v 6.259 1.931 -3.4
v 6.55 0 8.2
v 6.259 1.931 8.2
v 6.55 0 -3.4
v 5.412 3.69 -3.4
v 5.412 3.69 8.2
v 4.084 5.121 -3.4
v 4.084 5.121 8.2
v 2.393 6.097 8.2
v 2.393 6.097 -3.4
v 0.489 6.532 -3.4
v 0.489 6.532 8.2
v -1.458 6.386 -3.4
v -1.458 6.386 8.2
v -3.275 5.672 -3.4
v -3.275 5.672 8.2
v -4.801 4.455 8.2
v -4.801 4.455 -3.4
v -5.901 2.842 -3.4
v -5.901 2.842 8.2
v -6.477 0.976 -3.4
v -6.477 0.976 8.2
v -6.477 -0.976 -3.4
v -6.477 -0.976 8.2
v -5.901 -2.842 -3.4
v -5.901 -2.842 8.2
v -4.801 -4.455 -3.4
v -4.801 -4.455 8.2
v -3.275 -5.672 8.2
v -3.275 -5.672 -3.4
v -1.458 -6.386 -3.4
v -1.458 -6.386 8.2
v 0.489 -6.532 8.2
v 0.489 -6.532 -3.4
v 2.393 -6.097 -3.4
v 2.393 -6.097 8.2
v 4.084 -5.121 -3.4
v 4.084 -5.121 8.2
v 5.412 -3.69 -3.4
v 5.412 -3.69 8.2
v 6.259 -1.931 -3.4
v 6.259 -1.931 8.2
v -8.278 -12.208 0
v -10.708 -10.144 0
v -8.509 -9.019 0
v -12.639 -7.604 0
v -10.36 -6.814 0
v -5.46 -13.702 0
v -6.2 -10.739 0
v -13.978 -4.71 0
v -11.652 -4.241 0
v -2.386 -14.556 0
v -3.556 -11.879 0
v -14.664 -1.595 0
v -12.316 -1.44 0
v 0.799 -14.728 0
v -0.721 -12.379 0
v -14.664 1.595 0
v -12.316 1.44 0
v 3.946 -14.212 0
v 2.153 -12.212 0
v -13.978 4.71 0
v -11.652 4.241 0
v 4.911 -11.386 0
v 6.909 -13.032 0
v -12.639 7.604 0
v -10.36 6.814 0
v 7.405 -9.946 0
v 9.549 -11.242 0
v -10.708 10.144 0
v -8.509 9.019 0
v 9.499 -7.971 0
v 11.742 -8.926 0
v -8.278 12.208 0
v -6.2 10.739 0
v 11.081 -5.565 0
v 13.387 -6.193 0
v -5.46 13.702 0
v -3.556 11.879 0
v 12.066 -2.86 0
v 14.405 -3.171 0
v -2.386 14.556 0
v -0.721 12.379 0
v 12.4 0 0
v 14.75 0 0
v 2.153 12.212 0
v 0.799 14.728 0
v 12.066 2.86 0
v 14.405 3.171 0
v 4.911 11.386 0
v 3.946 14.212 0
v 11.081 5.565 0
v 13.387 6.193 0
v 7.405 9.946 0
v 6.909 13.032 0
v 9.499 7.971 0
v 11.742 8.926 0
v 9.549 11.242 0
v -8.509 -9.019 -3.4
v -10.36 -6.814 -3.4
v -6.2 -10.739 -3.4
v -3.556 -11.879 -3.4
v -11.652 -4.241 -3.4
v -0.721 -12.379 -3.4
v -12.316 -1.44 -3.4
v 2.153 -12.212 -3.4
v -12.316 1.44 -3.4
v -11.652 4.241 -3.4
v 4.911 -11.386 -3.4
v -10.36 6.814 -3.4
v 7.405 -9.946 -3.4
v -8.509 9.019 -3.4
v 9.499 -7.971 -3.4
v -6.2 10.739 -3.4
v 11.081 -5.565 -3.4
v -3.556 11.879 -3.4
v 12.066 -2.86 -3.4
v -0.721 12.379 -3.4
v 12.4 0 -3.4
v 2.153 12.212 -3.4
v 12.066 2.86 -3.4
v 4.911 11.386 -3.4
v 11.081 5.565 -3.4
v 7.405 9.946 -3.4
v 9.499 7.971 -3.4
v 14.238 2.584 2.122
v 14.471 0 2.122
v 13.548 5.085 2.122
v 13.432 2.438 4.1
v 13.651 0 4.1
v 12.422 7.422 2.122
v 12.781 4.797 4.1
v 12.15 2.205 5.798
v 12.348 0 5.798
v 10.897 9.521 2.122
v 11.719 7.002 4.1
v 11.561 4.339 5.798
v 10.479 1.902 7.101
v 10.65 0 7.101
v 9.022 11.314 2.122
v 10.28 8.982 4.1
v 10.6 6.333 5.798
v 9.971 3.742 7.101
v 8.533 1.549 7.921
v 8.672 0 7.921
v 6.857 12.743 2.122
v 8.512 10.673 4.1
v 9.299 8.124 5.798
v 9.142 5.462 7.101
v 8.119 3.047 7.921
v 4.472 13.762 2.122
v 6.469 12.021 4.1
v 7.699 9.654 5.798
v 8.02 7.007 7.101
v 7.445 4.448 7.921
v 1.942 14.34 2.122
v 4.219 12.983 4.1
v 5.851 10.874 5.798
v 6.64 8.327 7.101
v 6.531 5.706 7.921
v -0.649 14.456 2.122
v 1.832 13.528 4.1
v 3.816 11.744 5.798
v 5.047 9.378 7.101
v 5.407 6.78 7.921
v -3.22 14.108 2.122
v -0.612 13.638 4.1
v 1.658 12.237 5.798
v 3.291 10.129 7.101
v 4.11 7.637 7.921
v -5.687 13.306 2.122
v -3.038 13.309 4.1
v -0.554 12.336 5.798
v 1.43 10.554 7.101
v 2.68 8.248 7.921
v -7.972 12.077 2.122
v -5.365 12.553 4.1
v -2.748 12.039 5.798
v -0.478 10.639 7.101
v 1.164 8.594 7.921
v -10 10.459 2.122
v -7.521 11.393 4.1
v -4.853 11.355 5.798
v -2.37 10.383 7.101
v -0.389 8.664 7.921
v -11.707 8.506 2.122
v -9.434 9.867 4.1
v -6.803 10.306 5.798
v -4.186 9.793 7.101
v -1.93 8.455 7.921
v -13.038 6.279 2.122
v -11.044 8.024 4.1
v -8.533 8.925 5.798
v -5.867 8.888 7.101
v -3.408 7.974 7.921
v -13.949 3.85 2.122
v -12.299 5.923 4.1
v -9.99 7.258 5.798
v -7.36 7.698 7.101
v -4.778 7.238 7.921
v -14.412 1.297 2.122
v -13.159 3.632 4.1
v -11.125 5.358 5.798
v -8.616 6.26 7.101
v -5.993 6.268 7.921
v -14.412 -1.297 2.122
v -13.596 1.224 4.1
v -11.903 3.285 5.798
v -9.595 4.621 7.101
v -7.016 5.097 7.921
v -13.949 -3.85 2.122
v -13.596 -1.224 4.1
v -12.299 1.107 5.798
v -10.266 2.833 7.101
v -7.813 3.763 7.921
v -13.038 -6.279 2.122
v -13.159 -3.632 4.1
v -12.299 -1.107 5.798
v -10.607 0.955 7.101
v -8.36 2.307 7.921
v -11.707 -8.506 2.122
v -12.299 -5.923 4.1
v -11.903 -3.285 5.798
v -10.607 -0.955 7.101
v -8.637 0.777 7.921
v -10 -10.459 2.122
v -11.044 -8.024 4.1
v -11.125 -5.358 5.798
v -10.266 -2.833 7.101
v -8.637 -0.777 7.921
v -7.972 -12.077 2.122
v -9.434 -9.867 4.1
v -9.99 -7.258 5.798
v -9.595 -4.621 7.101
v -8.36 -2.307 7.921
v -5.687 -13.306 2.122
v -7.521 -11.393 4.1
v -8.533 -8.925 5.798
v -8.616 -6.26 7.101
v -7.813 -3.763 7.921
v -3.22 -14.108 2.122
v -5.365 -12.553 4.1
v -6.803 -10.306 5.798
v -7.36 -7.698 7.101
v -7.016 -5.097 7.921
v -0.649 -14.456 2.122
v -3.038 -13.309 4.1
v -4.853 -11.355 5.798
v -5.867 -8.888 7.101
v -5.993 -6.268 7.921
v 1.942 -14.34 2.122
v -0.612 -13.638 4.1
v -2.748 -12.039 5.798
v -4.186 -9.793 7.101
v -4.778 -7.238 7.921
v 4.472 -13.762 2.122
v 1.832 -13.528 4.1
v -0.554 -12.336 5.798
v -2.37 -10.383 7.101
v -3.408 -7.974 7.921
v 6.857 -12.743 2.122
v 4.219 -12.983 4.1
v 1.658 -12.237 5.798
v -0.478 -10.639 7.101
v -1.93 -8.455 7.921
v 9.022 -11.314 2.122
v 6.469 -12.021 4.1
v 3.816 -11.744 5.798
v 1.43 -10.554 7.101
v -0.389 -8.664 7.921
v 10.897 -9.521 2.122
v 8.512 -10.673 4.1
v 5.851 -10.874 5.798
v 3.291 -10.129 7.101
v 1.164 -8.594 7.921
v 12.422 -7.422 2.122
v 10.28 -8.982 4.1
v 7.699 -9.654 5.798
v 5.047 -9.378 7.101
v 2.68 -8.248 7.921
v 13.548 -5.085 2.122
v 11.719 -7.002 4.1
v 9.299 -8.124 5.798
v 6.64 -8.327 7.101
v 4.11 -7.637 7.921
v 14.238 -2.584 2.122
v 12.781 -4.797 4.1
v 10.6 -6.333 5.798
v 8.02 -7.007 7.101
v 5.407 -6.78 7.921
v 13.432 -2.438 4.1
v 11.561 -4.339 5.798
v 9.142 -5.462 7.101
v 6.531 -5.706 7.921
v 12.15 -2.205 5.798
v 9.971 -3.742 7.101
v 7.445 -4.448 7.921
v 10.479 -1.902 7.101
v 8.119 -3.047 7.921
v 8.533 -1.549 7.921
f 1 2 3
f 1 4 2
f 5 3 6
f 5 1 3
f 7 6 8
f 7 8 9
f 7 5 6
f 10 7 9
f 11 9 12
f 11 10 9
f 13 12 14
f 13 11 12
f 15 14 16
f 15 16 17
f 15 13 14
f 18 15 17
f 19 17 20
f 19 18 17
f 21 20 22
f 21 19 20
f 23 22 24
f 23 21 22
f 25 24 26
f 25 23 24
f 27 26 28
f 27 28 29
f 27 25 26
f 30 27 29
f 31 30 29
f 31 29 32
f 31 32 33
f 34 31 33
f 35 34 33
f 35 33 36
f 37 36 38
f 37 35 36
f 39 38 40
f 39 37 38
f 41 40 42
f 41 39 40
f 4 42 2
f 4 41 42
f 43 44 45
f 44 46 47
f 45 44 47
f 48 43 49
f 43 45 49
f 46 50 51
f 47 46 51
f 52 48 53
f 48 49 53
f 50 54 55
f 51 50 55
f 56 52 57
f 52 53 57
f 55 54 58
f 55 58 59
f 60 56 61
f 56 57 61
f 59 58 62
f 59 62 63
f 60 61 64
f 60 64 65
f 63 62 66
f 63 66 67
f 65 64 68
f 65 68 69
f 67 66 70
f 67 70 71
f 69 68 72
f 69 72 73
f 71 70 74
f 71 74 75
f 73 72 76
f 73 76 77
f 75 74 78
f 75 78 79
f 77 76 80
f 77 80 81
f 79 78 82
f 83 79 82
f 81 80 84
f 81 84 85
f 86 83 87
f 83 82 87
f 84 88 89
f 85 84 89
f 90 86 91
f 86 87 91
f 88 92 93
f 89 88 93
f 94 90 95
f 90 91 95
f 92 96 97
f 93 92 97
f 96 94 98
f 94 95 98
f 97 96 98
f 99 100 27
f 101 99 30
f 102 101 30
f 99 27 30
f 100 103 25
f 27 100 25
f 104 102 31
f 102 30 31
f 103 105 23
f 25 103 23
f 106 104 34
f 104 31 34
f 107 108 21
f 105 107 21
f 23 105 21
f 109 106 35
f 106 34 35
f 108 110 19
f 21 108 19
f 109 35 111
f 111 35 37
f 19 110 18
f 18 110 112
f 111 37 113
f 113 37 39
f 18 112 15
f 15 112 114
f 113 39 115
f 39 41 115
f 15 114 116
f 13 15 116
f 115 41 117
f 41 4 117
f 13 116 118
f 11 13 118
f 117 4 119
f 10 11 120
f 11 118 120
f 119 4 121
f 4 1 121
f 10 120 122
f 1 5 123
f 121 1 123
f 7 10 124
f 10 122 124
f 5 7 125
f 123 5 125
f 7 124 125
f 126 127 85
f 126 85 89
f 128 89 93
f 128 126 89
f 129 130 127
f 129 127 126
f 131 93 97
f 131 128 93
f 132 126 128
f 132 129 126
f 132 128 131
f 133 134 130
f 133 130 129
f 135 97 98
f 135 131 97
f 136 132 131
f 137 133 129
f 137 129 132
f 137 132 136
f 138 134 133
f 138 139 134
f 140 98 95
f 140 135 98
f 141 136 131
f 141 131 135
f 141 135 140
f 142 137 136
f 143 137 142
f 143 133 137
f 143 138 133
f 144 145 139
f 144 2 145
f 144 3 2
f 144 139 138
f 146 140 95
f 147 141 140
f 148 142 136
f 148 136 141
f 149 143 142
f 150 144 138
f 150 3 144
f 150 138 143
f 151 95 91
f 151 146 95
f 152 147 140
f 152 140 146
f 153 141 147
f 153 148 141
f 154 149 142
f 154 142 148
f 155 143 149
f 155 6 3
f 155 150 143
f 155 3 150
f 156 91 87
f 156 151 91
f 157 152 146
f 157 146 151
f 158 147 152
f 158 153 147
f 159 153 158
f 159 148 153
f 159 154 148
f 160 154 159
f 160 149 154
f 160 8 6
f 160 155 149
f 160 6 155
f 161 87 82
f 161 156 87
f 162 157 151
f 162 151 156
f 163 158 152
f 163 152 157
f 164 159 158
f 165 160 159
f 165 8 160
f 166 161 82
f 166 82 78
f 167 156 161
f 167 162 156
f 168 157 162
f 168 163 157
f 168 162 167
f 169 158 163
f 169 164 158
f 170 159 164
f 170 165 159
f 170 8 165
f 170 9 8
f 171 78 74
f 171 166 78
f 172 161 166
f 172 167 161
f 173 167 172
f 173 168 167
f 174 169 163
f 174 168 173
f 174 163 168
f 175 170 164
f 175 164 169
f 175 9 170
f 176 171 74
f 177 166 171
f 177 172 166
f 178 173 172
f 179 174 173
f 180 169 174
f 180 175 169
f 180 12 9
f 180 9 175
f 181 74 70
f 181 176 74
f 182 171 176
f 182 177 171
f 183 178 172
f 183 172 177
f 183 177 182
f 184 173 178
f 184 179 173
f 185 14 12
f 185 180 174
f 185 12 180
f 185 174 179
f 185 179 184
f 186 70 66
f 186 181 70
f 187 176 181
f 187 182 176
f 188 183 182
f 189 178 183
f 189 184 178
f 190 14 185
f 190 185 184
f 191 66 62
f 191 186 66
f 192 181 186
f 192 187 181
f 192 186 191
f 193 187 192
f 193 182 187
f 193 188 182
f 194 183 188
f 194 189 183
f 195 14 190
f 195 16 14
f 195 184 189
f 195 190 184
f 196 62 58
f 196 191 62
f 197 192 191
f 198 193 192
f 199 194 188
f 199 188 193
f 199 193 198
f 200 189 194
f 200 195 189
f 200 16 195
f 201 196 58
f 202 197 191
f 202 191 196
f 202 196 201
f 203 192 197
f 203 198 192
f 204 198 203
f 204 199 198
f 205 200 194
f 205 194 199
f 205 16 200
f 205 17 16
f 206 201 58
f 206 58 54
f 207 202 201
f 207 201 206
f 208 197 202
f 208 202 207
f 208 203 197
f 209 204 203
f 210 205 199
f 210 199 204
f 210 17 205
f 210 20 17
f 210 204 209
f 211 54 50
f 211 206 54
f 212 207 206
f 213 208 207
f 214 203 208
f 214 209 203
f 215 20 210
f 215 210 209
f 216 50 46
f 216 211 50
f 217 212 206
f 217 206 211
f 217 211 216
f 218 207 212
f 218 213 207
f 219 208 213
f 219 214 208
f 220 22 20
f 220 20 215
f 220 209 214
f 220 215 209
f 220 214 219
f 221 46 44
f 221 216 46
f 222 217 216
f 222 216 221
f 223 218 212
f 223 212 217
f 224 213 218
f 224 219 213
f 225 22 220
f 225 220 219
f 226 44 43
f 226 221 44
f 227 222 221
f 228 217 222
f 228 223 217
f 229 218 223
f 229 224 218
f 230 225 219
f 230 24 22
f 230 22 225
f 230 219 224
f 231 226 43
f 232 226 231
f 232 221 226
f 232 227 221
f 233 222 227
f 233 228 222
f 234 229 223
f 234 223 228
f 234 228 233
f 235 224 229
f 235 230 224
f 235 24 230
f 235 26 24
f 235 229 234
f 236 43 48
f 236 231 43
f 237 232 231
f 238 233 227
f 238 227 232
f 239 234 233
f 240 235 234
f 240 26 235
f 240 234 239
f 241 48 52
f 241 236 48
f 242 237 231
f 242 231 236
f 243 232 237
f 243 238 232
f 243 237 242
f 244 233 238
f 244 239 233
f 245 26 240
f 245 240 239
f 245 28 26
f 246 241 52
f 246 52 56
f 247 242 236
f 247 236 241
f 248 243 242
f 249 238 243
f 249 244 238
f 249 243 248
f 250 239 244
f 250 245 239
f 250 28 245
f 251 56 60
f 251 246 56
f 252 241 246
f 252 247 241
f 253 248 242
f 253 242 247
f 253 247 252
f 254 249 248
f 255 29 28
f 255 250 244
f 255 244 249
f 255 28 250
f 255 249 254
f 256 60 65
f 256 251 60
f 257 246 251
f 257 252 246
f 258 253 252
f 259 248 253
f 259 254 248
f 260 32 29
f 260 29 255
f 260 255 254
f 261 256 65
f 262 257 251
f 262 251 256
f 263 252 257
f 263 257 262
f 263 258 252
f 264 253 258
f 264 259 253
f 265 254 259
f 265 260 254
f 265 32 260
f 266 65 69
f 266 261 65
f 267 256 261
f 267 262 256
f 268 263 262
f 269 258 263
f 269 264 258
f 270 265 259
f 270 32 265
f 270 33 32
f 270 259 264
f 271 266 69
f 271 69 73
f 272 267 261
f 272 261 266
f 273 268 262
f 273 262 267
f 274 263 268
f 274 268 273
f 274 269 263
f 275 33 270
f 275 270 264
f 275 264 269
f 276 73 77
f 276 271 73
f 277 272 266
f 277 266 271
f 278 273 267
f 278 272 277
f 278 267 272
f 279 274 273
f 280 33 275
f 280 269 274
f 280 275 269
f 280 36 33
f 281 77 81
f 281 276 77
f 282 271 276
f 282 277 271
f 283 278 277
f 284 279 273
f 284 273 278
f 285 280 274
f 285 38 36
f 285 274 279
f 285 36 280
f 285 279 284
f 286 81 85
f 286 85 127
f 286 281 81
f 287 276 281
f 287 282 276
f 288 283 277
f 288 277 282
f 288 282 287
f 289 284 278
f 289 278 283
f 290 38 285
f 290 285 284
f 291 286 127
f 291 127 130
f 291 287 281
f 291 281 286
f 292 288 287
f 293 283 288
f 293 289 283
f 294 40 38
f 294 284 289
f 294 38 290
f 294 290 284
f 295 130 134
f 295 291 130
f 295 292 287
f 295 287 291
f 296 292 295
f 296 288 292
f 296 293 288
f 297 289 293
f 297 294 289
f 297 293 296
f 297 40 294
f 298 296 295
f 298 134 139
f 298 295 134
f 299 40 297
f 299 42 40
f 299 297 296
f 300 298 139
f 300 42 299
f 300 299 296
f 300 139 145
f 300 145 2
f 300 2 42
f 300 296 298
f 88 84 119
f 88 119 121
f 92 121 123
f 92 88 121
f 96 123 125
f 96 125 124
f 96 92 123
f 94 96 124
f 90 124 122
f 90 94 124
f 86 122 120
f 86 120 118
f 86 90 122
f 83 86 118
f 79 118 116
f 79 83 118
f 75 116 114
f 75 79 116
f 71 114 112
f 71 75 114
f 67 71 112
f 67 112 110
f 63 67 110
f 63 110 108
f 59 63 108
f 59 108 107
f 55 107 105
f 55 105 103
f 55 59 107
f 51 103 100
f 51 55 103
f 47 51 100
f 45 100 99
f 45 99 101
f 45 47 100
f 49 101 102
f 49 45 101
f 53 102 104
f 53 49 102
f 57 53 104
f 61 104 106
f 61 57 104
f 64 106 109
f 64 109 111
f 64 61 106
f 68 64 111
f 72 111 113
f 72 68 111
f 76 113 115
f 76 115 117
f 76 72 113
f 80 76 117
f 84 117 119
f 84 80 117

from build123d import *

# Parameters (mm, degrees)
F0_R        = 12.4
F0_R_2      = 6.55
F1_DEPTH    = 3.4
F0_R_3      = 14.75
F1_FACE_R   = 12.4
F1_FACE_R_2 = 6.55
F2_DEPTH    = 8.2
F3_R        = 8.19999


# Not quite as in the source:
# - a fillet or chamfer is up to 0.001 mm smaller than in the source, because OpenCascade refuses the exact size


with BuildPart() as f1:
    # F0 (on Top) → F1 (new body)
    with BuildSketch(Plane.XY):
        Circle(F0_R)
        Circle(F0_R_2, mode=Mode.SUBTRACT)
    extrude(amount=-F1_DEPTH)

    # F0 (on Top) + F1_face (on face) → F2 (join)
    with BuildSketch(Plane.XY):
        Circle(F0_R_3)
        Circle(F0_R, mode=Mode.SUBTRACT)
    with BuildSketch(Plane.XY):
        Circle(F1_FACE_R)
        Circle(F1_FACE_R_2, mode=Mode.SUBTRACT)
    extrude(amount=F2_DEPTH)

    # F3 (radius 8.2 in the source; OpenCascade refuses exactly that, so slightly less here)
    f3_edges = [f1.edges().sort_by_distance(p)[0] for p in [
        (-14.75, 0, 8.2),
    ]]
    fillet(f3_edges, radius=F3_R)


solid = f1.part
